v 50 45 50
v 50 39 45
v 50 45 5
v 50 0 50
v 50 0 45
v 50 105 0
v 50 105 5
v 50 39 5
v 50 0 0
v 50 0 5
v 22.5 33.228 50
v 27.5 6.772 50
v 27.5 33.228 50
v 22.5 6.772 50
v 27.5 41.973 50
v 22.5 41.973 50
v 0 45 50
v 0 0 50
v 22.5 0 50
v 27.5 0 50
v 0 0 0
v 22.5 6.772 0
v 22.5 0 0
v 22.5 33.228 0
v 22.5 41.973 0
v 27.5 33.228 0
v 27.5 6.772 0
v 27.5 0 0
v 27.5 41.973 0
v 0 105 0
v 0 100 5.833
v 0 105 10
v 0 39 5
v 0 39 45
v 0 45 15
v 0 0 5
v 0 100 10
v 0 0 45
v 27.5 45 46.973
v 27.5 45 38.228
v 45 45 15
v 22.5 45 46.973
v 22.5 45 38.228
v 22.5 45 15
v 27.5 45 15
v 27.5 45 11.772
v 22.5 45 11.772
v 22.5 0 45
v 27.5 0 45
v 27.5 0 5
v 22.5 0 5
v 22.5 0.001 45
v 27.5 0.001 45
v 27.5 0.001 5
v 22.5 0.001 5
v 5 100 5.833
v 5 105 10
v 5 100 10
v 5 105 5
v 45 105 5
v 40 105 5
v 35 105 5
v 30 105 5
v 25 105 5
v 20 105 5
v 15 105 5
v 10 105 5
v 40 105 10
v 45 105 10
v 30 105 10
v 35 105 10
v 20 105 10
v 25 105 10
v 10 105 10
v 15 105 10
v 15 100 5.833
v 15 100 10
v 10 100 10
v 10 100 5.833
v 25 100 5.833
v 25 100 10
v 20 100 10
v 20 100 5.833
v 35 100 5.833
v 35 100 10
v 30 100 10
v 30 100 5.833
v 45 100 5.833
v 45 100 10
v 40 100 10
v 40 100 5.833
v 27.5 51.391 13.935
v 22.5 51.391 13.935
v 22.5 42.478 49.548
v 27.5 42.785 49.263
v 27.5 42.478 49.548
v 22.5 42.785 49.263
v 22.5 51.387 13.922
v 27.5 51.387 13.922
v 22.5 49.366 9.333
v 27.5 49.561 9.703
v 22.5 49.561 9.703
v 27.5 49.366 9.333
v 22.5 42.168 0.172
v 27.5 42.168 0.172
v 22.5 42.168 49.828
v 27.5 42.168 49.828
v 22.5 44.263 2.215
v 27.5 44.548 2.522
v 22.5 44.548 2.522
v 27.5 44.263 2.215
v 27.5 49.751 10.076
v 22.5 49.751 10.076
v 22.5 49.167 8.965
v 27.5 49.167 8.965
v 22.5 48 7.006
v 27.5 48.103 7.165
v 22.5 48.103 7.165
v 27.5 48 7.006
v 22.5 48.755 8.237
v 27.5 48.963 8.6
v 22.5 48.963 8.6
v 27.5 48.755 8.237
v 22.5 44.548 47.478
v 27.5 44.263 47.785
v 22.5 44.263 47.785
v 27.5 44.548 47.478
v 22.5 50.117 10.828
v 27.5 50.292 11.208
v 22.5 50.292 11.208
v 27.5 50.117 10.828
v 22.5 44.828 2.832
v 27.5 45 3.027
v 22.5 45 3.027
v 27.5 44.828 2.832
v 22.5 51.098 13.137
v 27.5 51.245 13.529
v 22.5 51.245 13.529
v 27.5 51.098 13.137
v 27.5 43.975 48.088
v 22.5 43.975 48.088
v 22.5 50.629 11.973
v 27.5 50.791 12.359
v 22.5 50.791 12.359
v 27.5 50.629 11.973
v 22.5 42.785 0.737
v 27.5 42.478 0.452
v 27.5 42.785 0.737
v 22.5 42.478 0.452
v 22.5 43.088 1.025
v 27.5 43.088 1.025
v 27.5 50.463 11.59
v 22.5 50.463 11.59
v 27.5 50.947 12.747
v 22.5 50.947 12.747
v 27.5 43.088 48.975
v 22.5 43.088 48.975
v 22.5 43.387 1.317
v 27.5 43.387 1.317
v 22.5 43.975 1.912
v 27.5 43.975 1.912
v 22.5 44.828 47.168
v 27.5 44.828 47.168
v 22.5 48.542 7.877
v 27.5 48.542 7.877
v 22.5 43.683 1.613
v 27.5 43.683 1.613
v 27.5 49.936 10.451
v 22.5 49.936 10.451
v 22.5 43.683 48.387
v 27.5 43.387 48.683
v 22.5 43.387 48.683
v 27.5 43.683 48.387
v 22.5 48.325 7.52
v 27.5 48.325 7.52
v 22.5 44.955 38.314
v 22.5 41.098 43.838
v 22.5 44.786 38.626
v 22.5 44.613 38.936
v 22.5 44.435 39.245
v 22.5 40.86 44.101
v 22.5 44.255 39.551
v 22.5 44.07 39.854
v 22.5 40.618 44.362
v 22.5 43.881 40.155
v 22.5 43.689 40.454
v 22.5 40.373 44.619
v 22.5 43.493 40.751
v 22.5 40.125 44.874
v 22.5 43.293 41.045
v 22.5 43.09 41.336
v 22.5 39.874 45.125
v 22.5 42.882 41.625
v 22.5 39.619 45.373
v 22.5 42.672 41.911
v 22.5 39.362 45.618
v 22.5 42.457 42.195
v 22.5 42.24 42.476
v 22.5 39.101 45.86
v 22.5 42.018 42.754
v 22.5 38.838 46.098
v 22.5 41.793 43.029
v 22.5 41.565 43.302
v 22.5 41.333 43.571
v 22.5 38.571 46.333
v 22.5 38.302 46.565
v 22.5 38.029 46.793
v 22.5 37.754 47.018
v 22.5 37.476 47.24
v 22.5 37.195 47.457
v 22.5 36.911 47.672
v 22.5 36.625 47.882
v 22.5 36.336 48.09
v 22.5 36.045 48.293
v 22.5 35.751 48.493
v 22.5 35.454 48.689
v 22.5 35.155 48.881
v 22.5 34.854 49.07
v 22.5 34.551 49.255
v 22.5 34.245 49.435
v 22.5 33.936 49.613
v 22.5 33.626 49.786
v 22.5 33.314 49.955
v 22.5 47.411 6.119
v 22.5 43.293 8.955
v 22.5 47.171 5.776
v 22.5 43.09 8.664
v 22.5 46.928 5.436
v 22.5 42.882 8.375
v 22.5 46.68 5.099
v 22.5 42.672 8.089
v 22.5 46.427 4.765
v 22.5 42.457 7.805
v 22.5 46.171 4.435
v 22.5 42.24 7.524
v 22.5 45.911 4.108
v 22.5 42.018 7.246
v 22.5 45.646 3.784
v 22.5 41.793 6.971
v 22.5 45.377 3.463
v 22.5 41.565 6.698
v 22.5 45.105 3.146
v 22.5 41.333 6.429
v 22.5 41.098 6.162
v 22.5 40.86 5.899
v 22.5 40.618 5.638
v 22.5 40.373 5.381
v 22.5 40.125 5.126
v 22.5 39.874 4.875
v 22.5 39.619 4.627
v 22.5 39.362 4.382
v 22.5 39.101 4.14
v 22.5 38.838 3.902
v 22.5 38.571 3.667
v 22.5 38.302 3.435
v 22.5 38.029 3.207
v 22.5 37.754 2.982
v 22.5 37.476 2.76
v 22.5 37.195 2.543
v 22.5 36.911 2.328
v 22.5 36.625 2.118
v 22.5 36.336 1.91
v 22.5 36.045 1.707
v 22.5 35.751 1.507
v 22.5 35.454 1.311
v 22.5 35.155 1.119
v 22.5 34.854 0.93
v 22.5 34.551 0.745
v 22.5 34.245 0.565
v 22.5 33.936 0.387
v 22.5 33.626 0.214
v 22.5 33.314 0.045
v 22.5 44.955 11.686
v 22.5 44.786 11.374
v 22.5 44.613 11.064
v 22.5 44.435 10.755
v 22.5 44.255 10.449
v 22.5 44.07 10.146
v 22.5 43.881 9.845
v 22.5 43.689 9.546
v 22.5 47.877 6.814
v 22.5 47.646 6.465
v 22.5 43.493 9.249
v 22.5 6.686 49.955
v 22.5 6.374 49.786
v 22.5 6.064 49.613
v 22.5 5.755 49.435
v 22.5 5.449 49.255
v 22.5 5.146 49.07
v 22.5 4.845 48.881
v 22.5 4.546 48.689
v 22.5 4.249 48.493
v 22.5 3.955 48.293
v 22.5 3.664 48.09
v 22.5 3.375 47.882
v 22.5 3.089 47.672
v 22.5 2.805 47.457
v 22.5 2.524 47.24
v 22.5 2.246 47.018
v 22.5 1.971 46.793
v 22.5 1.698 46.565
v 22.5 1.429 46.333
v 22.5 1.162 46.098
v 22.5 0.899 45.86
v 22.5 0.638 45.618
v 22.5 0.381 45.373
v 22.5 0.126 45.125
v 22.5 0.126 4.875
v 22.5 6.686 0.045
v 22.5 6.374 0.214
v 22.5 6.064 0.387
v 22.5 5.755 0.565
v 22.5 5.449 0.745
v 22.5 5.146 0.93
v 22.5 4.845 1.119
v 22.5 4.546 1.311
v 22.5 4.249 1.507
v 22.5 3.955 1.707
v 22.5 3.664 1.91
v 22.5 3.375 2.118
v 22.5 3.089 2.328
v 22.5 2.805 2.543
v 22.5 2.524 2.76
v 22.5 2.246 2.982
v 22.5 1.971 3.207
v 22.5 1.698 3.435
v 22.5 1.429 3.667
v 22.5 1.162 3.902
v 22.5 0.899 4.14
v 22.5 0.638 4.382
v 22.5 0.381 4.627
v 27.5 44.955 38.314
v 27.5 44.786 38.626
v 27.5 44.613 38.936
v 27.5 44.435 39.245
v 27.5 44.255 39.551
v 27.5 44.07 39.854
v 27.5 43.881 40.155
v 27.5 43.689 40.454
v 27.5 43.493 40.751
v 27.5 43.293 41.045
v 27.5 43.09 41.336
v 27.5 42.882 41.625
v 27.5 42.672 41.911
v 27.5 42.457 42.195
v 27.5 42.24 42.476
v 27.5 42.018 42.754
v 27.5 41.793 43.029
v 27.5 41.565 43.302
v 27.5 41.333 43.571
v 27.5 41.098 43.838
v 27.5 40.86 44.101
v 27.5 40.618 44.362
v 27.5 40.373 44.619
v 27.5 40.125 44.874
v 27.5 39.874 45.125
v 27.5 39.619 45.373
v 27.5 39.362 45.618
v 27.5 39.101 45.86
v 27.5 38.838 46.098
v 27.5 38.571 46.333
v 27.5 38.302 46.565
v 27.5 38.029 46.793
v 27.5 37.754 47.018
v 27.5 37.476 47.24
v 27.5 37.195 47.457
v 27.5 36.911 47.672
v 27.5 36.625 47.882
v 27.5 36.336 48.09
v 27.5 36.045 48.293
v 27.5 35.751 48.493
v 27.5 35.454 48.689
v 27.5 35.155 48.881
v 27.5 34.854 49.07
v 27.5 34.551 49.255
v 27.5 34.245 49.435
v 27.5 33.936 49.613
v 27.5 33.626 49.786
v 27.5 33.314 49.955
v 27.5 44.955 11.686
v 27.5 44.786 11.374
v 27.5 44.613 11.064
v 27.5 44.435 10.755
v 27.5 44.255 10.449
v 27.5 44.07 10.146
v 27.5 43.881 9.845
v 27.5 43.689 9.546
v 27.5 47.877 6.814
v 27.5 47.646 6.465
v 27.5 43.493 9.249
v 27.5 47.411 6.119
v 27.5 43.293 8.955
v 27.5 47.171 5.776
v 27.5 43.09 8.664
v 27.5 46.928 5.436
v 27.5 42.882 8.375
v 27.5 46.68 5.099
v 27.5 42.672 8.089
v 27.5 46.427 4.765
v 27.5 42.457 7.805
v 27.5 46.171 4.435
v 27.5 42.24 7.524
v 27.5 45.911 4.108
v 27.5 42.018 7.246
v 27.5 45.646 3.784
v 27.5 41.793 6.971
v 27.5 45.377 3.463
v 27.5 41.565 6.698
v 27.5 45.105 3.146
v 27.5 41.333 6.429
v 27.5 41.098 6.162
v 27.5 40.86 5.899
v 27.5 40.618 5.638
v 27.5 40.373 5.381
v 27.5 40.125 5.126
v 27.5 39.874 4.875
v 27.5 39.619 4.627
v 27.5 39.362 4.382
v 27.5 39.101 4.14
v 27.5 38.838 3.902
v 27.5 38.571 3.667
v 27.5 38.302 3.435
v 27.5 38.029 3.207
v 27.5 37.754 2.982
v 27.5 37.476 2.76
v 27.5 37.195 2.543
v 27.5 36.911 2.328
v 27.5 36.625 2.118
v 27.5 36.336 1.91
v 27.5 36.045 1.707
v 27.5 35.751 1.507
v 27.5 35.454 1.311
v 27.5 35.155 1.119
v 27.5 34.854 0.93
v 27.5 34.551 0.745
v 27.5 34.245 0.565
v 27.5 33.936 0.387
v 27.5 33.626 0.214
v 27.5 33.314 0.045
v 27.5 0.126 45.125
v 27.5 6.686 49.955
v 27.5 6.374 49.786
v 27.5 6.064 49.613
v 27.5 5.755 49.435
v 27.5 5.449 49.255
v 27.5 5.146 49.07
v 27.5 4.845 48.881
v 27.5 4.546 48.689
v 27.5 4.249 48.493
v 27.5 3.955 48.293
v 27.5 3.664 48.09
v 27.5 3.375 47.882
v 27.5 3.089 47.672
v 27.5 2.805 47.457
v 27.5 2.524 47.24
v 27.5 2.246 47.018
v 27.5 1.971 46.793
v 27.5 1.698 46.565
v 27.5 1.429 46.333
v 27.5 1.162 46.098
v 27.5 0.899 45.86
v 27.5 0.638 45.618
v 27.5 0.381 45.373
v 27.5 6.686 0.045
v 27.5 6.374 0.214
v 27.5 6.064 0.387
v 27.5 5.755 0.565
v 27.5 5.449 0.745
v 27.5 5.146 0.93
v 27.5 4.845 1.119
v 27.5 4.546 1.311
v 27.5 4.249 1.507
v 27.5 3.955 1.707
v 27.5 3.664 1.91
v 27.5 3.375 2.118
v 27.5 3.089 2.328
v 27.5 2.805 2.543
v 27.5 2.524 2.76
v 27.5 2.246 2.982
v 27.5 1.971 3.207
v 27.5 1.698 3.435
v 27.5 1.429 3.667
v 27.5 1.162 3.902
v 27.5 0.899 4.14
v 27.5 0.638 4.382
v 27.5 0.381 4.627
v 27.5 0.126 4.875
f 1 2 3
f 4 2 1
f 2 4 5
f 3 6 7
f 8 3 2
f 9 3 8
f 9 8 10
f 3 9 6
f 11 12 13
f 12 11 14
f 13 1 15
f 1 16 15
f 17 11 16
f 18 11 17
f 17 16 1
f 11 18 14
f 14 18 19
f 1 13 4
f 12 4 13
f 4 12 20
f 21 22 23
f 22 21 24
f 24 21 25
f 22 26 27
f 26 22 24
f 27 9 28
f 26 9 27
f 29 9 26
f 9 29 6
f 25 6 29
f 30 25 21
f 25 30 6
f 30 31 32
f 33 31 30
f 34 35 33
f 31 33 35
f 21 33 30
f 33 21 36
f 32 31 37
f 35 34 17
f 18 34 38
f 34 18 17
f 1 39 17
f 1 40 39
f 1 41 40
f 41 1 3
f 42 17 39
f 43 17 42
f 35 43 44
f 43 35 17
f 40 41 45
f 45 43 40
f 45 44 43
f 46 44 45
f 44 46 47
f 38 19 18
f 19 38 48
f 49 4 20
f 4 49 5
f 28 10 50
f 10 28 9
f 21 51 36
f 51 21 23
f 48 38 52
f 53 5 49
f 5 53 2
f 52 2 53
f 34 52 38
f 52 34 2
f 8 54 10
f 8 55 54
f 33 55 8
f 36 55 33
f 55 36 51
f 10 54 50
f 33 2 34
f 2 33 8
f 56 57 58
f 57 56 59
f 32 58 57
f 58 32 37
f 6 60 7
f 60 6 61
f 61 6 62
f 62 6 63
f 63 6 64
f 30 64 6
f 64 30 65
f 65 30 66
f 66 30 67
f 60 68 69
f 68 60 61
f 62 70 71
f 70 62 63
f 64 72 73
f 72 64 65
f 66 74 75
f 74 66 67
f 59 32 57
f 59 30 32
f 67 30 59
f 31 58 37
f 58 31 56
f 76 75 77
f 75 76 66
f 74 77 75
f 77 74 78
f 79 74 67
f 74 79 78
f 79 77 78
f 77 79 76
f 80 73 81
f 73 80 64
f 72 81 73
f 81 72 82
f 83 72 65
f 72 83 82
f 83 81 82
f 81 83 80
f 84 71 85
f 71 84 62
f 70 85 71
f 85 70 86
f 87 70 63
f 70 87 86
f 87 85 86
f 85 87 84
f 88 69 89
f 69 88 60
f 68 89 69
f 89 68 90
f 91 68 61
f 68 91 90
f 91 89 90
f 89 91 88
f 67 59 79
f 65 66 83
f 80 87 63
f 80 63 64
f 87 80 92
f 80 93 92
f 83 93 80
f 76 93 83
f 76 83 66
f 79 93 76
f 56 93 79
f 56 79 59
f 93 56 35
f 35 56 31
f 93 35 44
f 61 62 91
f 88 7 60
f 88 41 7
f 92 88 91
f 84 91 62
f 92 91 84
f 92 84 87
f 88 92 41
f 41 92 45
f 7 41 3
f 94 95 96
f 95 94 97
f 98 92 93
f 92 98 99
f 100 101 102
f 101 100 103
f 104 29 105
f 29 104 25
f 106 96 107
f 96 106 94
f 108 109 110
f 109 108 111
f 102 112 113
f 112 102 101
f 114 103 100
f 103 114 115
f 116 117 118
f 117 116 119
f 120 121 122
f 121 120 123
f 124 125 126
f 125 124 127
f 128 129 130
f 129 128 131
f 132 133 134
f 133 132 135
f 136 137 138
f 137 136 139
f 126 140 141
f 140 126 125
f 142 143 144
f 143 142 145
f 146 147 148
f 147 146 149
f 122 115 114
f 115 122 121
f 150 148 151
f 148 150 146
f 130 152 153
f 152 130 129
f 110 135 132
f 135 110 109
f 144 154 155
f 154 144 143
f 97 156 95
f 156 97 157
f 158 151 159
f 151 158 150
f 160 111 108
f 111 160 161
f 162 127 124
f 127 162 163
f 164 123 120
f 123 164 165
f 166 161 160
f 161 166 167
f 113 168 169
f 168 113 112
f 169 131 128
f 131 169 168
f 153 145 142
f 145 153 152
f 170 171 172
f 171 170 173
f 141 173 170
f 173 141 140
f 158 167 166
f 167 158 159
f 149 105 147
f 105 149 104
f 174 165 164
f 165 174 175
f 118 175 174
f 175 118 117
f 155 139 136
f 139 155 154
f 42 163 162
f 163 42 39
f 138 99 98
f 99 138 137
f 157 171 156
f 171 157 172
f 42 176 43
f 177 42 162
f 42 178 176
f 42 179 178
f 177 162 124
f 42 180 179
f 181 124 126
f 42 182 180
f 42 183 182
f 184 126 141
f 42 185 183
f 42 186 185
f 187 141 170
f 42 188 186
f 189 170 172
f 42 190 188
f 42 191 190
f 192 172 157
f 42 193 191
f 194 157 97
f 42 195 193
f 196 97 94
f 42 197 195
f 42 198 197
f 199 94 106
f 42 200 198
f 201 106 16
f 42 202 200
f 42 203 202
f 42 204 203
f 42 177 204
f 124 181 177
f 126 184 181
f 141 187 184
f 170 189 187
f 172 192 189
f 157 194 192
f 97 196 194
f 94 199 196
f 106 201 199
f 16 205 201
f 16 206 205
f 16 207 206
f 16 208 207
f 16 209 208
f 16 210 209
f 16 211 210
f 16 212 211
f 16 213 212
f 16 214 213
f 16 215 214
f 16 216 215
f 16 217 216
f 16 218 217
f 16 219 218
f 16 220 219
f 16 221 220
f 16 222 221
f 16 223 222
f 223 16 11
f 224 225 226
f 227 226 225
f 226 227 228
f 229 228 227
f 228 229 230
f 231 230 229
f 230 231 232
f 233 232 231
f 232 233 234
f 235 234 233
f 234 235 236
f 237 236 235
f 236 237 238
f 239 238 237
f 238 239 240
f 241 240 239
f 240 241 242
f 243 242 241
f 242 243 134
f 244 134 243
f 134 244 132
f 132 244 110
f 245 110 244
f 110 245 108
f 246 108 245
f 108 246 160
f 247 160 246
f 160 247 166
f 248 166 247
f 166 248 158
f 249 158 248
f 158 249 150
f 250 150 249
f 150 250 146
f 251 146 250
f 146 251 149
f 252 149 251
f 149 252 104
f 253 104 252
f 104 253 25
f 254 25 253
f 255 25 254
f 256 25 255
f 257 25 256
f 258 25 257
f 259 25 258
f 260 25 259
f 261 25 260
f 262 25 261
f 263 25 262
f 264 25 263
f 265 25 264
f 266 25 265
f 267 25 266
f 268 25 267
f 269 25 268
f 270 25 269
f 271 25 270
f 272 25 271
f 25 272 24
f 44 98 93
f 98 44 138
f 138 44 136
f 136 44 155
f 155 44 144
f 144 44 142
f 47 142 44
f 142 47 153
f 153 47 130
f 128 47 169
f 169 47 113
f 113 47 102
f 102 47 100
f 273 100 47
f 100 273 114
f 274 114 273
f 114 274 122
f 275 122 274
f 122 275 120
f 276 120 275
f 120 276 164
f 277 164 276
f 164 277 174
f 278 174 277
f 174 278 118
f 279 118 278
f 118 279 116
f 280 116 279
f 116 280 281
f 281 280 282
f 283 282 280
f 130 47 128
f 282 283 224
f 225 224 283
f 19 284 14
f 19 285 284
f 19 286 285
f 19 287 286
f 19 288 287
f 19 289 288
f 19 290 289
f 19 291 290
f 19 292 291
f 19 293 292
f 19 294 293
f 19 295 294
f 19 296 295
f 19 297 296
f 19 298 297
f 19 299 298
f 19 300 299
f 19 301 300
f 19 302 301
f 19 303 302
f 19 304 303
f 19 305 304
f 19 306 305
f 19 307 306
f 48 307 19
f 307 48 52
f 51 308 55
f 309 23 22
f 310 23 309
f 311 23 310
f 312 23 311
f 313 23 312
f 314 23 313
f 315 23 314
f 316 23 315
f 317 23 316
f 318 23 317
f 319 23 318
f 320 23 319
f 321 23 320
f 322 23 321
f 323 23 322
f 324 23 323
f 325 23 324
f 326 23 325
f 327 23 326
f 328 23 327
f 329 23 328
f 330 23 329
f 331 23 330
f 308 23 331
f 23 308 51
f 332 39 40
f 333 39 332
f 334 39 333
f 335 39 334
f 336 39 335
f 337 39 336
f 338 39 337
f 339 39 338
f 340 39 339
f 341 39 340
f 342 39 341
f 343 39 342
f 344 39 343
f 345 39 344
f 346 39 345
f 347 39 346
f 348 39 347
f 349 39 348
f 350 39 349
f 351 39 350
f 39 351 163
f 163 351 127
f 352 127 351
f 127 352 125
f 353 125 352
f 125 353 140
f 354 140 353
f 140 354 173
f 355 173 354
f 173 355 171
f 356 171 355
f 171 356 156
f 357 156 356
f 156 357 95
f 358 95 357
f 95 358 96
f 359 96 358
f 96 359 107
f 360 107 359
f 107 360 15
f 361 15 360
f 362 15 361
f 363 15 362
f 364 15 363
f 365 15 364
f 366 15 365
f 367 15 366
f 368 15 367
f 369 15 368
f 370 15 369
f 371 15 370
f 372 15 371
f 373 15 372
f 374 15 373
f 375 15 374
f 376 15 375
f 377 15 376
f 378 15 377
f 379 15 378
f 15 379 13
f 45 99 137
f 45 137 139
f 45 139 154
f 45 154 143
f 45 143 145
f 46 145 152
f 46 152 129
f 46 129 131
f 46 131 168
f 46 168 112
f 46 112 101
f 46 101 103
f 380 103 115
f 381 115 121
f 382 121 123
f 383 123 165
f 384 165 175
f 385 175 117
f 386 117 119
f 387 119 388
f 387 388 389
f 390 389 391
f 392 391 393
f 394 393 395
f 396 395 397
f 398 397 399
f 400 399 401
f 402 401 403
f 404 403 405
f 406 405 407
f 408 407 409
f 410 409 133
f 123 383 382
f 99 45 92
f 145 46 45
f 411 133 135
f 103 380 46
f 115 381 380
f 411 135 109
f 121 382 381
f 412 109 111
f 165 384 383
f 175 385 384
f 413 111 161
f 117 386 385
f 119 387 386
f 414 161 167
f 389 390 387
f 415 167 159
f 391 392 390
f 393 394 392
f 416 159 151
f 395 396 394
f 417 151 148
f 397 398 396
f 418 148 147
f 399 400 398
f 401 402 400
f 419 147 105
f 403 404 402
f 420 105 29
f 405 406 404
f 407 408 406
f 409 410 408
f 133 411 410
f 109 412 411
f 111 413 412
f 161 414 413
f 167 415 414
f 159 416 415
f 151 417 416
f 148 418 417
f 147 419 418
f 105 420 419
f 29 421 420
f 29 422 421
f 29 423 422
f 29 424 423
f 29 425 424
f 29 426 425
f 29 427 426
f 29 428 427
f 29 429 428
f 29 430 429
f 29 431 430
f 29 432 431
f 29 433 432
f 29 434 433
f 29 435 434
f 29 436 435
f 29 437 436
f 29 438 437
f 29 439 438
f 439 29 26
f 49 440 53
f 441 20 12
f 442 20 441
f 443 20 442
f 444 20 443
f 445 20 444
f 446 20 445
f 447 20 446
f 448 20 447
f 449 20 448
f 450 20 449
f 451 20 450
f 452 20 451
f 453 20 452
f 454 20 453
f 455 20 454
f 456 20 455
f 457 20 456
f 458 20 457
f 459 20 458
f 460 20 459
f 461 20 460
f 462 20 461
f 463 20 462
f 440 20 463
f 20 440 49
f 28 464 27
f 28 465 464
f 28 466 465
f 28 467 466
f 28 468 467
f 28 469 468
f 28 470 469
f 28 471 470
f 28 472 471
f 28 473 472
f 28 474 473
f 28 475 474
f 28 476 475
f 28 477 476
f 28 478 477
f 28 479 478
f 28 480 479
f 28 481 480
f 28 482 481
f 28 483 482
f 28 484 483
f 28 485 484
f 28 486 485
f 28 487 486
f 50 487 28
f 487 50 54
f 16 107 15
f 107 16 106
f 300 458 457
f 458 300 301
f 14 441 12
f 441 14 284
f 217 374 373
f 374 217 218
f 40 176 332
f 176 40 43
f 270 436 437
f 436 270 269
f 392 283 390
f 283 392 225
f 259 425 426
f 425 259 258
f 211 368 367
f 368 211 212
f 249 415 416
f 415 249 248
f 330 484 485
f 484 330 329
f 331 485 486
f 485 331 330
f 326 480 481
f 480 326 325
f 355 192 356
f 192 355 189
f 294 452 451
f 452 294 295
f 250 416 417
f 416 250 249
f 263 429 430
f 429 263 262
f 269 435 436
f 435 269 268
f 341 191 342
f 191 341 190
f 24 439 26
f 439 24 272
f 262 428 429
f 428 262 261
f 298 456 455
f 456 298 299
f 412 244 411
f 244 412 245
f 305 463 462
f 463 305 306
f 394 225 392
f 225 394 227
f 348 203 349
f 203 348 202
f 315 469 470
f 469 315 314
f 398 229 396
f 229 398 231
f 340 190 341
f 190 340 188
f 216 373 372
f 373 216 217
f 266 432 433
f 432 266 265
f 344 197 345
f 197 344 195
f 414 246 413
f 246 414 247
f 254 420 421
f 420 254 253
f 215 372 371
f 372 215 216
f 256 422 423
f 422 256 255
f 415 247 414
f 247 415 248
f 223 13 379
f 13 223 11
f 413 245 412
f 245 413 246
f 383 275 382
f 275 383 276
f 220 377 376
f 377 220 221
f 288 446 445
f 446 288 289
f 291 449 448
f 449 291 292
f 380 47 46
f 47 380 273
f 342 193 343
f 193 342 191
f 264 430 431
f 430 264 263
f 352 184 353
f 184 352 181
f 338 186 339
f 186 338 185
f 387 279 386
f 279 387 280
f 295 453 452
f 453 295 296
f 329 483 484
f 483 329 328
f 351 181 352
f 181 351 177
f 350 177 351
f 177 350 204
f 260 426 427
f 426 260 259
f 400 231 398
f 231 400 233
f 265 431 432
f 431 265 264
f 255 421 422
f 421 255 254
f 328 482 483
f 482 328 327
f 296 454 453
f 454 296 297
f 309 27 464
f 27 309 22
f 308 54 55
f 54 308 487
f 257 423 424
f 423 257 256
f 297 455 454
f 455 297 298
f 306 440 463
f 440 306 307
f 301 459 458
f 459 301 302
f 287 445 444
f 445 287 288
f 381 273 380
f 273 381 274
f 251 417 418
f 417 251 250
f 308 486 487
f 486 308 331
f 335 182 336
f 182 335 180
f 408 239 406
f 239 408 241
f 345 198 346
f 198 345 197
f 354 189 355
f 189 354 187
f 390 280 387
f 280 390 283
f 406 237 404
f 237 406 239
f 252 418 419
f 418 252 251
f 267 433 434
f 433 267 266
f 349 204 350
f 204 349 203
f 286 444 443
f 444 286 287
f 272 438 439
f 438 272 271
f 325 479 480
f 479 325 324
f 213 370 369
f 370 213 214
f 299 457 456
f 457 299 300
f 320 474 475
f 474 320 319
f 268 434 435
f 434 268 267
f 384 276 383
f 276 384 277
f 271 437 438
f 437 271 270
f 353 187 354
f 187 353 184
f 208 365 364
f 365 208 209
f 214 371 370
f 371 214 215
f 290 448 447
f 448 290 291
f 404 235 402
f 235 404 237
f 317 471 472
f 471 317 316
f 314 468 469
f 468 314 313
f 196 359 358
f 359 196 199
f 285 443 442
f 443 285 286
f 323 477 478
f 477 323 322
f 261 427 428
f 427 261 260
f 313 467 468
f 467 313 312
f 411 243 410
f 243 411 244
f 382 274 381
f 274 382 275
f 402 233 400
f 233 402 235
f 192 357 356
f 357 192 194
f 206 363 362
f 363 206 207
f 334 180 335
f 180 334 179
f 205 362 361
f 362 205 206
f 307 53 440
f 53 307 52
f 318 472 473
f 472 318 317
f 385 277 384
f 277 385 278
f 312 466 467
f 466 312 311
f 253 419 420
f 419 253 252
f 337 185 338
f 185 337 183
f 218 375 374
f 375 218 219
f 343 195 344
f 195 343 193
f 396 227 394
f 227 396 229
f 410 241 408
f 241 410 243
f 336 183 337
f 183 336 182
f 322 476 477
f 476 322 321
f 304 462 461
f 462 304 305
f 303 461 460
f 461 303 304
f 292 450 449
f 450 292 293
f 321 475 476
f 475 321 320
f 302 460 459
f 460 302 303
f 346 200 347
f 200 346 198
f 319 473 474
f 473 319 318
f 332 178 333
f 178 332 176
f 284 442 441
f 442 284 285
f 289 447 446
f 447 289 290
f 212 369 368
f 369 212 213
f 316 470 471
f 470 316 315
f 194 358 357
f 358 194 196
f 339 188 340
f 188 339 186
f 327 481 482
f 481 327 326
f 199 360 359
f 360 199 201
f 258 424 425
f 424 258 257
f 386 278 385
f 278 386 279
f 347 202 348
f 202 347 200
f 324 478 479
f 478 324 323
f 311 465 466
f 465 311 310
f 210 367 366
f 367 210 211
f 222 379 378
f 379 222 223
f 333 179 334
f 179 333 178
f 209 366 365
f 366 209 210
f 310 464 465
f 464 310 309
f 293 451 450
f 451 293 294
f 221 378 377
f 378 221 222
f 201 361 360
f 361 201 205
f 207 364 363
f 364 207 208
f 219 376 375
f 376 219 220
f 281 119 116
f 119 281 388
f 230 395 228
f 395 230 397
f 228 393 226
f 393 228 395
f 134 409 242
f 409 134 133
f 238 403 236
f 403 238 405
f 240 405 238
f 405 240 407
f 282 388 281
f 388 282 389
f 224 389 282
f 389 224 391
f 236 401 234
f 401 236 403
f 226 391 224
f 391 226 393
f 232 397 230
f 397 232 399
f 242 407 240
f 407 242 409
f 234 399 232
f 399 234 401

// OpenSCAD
/**
 * @author Maciej Urbanski (rooter@kyberian.net)
 * @brief  Foot door pull - horizontal
 * @license GPL
 * @date   May, 2020
 * @version 1.0
 *
 * Foot door pool for front gate (square bars).
 */

gatebar_width = 40;
gatebar_depth = gatebar_width;

thickness = 5;

step_length = 60;
step_max_height = 3 * thickness;
step_width = 40;
step_tooth_height = thickness;
step_tooth_width = thickness;
step_tooth_spacing = thickness;

ziptie_width = 5;
ziptie_thickness = 3;

$fn = 500;
TINY = 1;    // a small number, just to make to avoid renderer issues
INF = 10000; // a large number, virtually infitive

grab_w = gatebar_width + 2 * thickness;
grab_d = gatebar_depth + thickness;

difference() {
  union() {
    difference() {
      cube([ grab_w, grab_d, gatebar_width + 2 * thickness ]);
      translate([ -TINY, -TINY, thickness ])
          cube([ INF, gatebar_width, gatebar_depth ]);
    }

    translate([ -(step_width - gatebar_width) / 2, grab_d - thickness, 0 ]) {
      hull() {
        cube(
            [ step_width + 2 * thickness, step_length + thickness, thickness ]);
        translate([ 0, 0, step_max_height - thickness ])
            cube([ step_width + thickness, thickness, thickness ]);
      }
      for (tooth_x = [0:step_tooth_width + step_tooth_spacing:step_width]) {
        translate([ tooth_x, step_length, thickness ]) {
          cube([ step_tooth_width, step_tooth_width, step_tooth_height ]);
        }
      }
    }
  }

  rr = gatebar_width * sqrt(2) / 2;
  translate([
    (grab_w - ziptie_width) / 2, gatebar_width / 2, gatebar_width / 2 +
    thickness
  ]) {
    rotate([ 0, 90, 0 ]) {
      difference() {
        cylinder(h = ziptie_width, r = rr + ziptie_width);
        cylinder(h = ziptie_width, r = rr);
      }
    }
  }
  intersection() {
    translate([ (grab_w - ziptie_width) / 2, grab_d, -TINY ])
        cube([ ziptie_width, ziptie_thickness, INF ]);
    translate([
      (grab_w - ziptie_width) / 2, gatebar_width / 2, gatebar_width / 2 +
      thickness
    ]) {
      rotate([ 0, 90, 0 ]) {
        cylinder(h = ziptie_width, r = rr + ziptie_width);
      }
    }
  }
}
